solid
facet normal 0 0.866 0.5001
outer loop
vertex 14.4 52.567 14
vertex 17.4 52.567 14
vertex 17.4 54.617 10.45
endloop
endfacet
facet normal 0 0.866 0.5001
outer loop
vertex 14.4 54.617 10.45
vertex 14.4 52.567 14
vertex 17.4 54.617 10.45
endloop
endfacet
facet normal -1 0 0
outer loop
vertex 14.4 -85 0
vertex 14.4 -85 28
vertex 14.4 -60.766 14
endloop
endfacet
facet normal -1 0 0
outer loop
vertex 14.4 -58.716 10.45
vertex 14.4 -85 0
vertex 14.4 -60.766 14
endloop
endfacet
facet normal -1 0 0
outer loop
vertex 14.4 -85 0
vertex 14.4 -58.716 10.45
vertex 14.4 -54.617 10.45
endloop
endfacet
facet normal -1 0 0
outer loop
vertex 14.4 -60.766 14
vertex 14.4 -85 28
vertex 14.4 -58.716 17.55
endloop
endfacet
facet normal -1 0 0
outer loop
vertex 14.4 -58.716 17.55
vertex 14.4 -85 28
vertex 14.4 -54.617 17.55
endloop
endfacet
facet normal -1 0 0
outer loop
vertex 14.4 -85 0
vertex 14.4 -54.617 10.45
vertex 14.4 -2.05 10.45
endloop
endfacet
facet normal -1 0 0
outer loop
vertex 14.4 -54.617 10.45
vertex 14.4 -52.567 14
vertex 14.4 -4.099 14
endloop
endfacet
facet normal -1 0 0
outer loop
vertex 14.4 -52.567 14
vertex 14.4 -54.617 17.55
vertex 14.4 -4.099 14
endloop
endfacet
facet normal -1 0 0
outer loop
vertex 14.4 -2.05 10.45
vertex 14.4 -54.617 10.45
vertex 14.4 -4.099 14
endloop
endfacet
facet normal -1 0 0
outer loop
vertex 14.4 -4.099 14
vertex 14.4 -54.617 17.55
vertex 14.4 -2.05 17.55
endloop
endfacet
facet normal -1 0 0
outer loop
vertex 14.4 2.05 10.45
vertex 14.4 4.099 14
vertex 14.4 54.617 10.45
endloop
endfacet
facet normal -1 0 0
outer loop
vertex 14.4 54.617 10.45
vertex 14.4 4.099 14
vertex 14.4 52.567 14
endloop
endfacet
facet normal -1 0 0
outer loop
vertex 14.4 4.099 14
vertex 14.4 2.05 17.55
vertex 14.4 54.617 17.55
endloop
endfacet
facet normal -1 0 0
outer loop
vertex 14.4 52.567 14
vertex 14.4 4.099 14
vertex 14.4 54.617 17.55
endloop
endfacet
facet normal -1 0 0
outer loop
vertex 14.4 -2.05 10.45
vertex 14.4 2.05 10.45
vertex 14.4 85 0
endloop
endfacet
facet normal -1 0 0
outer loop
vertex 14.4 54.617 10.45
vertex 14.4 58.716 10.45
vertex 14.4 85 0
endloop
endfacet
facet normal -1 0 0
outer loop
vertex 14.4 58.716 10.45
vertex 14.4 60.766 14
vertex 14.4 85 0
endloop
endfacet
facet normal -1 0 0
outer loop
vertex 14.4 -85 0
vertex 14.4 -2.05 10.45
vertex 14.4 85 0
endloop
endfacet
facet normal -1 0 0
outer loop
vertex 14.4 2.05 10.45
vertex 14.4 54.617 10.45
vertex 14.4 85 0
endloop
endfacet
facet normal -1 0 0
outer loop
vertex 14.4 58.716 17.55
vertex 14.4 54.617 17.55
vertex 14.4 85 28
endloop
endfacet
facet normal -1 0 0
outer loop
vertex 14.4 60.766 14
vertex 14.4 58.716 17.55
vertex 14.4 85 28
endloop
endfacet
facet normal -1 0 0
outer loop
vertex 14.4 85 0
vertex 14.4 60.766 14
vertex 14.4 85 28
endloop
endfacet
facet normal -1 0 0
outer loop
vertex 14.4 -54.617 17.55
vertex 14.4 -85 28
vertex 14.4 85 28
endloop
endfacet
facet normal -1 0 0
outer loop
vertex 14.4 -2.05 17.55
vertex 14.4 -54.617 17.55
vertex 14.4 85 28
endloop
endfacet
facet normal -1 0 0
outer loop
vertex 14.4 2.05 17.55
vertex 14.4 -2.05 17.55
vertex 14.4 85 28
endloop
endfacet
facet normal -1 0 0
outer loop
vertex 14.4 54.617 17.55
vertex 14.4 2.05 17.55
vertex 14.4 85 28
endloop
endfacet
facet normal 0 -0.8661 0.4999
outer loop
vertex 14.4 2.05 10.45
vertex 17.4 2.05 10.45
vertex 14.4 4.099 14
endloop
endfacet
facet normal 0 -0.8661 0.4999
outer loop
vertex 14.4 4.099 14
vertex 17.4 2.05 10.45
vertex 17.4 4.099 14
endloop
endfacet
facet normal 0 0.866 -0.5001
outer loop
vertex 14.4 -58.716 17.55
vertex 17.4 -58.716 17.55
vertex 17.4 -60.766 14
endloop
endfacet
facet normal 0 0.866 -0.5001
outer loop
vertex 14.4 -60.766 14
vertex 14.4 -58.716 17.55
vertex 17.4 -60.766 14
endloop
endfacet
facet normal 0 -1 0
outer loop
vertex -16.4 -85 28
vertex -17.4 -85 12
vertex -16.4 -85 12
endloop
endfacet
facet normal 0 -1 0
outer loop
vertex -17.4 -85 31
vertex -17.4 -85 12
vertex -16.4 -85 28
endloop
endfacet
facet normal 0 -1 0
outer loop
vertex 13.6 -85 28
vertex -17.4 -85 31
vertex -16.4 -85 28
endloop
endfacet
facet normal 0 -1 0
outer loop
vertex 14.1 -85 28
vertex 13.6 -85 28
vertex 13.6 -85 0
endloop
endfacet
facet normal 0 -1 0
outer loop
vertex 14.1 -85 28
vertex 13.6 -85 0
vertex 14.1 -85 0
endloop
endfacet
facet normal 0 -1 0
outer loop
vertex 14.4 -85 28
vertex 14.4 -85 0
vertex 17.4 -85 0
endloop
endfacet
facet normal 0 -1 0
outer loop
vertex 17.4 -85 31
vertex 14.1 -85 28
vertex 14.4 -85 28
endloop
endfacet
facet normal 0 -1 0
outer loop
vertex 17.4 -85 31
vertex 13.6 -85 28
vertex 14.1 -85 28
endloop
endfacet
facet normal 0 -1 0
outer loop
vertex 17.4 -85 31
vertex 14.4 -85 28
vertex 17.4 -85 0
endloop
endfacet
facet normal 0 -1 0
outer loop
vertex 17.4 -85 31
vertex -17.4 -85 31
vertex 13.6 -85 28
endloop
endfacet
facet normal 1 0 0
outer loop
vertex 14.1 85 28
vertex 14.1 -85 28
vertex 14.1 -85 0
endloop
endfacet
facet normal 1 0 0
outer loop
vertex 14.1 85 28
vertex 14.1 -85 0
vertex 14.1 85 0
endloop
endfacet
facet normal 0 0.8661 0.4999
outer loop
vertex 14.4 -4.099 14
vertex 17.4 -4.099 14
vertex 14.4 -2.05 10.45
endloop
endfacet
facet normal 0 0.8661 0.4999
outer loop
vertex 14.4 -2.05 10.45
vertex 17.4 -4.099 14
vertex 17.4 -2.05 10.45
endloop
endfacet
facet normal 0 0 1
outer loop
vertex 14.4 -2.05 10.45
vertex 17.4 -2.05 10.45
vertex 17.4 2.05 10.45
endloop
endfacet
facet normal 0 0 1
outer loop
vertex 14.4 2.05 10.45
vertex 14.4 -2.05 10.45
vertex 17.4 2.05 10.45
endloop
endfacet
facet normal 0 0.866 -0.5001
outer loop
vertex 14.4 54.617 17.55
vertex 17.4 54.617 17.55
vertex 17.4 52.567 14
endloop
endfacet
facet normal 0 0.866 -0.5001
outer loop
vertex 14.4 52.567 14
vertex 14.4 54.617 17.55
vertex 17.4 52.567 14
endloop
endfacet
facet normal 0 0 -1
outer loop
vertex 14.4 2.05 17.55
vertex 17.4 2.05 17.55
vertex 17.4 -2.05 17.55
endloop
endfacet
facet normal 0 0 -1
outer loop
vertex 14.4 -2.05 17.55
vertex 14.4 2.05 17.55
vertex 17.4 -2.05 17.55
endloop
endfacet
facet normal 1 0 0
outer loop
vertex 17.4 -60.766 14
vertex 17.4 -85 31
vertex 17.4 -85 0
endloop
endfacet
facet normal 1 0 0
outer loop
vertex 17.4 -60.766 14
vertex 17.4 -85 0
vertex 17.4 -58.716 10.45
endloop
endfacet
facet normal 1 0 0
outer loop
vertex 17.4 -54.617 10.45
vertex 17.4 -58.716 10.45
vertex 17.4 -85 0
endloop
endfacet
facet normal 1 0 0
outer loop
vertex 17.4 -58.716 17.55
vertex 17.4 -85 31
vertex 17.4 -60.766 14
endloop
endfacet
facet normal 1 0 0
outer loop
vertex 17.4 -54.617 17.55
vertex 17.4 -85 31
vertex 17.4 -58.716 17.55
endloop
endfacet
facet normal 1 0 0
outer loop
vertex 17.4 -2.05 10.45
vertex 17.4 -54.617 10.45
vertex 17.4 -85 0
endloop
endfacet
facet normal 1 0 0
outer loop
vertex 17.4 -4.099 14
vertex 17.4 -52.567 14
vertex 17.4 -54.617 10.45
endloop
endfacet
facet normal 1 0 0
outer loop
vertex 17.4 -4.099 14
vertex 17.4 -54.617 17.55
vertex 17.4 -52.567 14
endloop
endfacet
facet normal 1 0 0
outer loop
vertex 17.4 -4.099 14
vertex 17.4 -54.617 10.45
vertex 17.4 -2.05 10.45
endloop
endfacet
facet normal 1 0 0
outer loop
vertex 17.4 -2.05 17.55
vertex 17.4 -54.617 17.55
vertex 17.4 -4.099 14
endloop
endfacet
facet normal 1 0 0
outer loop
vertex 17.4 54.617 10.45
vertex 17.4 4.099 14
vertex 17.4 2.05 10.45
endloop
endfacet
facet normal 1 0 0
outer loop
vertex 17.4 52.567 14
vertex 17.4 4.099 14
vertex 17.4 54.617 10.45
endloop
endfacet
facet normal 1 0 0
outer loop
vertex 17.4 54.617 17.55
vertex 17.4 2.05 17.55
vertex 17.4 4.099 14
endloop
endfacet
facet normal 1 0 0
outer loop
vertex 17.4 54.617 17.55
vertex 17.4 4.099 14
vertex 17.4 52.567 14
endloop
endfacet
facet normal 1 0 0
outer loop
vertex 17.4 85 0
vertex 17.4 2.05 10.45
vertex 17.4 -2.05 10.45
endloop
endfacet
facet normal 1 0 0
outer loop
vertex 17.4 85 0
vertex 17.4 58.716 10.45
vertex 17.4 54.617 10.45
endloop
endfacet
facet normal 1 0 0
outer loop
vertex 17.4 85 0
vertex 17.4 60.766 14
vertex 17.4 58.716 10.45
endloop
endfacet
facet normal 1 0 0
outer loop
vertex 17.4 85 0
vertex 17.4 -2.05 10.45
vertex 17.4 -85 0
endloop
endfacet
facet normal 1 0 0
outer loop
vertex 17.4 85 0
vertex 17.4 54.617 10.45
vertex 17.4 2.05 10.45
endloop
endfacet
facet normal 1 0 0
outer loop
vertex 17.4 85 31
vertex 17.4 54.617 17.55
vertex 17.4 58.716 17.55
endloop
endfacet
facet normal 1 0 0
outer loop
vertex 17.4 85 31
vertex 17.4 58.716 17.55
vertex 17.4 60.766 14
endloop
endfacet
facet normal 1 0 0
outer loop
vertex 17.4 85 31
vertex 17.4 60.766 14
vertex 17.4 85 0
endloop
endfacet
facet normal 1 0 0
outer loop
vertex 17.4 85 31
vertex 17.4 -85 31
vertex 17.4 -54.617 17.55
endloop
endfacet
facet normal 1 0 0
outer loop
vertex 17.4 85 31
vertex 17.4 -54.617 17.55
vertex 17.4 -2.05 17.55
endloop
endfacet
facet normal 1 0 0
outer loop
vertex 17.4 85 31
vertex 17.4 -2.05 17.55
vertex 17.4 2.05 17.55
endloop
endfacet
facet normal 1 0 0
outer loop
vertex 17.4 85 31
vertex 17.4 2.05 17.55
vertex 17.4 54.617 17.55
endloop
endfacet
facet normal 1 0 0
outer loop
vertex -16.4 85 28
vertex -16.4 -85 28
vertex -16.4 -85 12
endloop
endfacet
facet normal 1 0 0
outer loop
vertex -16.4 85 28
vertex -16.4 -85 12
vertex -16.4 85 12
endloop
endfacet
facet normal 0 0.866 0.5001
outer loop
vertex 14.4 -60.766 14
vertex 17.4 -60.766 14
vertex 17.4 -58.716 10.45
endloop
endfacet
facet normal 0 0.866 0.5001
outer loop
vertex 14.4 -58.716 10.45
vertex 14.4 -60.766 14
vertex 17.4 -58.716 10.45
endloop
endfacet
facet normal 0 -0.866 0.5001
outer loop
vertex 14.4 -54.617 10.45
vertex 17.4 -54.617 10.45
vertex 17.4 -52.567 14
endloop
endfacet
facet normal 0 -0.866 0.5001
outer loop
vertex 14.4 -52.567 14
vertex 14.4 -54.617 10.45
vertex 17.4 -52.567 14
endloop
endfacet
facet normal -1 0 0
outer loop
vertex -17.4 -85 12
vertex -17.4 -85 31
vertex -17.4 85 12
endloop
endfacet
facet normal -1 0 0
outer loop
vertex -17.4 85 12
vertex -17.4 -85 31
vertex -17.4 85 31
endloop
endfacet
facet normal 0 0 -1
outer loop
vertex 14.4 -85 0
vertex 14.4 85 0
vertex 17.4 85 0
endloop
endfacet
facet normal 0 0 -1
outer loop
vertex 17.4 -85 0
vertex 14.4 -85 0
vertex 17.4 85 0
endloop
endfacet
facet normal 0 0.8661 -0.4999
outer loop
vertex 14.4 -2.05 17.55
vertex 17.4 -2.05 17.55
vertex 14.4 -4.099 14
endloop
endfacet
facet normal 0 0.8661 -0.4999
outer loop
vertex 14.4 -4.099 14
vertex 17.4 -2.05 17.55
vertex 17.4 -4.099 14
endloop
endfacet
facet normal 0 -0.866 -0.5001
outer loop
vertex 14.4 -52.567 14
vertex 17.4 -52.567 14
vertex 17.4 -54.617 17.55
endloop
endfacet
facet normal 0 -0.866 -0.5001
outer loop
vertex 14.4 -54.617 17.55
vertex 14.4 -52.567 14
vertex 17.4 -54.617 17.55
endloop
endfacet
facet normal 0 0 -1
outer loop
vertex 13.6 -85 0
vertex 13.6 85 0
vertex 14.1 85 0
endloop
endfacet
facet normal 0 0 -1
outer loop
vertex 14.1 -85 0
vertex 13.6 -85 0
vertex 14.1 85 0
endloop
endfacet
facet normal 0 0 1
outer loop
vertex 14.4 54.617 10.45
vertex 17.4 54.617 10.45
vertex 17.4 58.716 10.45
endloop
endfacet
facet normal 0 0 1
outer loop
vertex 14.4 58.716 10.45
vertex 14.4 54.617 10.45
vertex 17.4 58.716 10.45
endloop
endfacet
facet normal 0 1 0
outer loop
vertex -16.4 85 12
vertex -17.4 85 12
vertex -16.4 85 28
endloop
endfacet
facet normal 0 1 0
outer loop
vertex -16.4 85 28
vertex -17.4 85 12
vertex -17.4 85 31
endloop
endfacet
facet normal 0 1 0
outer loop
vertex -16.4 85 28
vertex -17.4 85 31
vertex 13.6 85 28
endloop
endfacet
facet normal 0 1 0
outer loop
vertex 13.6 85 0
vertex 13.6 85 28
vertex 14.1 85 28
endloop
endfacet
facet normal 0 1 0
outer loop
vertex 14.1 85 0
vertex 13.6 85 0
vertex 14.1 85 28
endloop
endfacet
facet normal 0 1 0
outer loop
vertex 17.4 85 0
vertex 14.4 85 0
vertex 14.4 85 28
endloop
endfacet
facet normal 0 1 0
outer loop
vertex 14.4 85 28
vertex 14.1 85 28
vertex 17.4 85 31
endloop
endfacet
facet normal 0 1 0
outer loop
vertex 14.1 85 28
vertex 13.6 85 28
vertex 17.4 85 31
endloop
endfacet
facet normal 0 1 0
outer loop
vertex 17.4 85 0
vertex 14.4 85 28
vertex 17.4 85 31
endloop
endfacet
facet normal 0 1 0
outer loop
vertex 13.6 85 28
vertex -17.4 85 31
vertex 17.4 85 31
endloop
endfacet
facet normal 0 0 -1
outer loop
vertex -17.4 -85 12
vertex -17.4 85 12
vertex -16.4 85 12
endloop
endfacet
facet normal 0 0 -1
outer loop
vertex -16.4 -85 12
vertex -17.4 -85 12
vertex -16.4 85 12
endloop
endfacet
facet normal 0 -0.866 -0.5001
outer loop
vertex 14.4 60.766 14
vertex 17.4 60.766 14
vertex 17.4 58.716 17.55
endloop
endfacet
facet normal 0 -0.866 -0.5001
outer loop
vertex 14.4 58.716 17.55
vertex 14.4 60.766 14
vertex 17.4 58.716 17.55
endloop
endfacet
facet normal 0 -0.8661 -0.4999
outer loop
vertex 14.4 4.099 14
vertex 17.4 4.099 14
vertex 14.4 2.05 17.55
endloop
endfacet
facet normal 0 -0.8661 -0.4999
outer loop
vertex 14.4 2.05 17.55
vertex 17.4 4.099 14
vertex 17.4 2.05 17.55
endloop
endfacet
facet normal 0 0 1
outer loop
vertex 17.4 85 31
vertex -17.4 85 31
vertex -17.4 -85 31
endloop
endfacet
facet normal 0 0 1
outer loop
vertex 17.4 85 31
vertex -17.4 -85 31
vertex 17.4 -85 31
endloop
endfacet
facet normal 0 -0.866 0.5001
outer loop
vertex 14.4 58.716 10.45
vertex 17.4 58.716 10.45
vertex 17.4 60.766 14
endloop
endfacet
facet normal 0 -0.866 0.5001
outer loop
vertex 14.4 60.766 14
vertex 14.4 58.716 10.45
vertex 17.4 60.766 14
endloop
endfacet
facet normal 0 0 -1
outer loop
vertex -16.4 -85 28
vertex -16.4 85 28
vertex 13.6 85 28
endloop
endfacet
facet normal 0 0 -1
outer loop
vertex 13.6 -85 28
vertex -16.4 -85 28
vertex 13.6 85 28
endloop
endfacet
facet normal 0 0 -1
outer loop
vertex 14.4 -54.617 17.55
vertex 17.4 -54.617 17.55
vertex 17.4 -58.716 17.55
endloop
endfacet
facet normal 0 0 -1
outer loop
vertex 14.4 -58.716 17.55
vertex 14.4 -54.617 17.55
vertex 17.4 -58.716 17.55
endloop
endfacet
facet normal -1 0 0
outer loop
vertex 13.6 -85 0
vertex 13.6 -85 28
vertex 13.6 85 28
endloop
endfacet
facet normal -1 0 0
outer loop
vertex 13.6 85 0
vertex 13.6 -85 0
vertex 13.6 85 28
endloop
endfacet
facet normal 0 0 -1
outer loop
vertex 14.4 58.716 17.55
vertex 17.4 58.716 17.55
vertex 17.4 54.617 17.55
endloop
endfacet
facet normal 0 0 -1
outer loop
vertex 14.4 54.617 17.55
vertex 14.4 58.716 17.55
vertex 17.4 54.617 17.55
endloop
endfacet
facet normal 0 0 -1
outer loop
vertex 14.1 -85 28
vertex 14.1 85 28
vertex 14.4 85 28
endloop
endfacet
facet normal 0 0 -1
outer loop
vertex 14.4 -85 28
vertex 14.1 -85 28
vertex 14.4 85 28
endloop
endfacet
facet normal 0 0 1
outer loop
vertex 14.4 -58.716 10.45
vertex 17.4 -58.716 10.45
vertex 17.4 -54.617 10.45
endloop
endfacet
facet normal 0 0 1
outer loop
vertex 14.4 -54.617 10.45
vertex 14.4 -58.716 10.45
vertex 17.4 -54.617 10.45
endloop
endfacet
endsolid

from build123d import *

# Parameters (mm, degrees)
SKETCH001_W  = 34.8
SKETCH001_H  = 170
PAD_DEPTH    = 3
SKETCH002_W  = 1
SKETCH002_H  = 170
PAD001_DEPTH = 16
SKETCH_W     = 3
SKETCH_H     = 170
SKETCH_W_2   = 0.5
PAD002_DEPTH = 28
POCKET_DEPTH = 3


with BuildPart() as part:
    # Sketch001 (on DatumPlane) → Pad (new body)
    with BuildSketch(Plane.XY.offset(28)):
        Rectangle(SKETCH001_W, SKETCH001_H)
    extrude(amount=PAD_DEPTH)

    # Sketch002 (on DatumPlane) → Pad001 (join)
    with BuildSketch(Plane.XY.offset(28)):
        with Locations((-16.9, 0)):
            Rectangle(SKETCH002_W, SKETCH002_H)
    extrude(amount=-PAD001_DEPTH)

    # Sketch (on DatumPlane) → Pad002 (join)
    with BuildSketch(Plane.XY.offset(28)):
        with Locations((15.9, 0)):
            Rectangle(SKETCH_W, SKETCH_H)
        with Locations((13.85, 0)):
            Rectangle(SKETCH_W_2, SKETCH_H)
    extrude(amount=-PAD002_DEPTH)

    # Sketch003 (on Face12 of Pad002) → Pocket (cut)
    with BuildSketch(Plane(origin=(17.4, 0, 28), x_dir=(0, 1, 0), z_dir=(1, 0, 0))):
        Polygon((-54.617073, -17.55), (-52.56748, -14), (-54.617073, -10.45), (-58.71626, -10.45), (-60.765854, -14), (-58.71626, -17.55), align=None)
        Polygon((2.049593, -17.55), (4.099187, -14), (2.049593, -10.45), (-2.049593, -10.45), (-4.099187, -14), (-2.049593, -17.55), align=None)
        Polygon((54.617073, -17.55), (58.71626, -17.55), (60.765854, -14), (58.71626, -10.45), (54.617073, -10.45), (52.56748, -14), align=None)
    extrude(amount=-POCKET_DEPTH, mode=Mode.SUBTRACT)


solid = part.part
